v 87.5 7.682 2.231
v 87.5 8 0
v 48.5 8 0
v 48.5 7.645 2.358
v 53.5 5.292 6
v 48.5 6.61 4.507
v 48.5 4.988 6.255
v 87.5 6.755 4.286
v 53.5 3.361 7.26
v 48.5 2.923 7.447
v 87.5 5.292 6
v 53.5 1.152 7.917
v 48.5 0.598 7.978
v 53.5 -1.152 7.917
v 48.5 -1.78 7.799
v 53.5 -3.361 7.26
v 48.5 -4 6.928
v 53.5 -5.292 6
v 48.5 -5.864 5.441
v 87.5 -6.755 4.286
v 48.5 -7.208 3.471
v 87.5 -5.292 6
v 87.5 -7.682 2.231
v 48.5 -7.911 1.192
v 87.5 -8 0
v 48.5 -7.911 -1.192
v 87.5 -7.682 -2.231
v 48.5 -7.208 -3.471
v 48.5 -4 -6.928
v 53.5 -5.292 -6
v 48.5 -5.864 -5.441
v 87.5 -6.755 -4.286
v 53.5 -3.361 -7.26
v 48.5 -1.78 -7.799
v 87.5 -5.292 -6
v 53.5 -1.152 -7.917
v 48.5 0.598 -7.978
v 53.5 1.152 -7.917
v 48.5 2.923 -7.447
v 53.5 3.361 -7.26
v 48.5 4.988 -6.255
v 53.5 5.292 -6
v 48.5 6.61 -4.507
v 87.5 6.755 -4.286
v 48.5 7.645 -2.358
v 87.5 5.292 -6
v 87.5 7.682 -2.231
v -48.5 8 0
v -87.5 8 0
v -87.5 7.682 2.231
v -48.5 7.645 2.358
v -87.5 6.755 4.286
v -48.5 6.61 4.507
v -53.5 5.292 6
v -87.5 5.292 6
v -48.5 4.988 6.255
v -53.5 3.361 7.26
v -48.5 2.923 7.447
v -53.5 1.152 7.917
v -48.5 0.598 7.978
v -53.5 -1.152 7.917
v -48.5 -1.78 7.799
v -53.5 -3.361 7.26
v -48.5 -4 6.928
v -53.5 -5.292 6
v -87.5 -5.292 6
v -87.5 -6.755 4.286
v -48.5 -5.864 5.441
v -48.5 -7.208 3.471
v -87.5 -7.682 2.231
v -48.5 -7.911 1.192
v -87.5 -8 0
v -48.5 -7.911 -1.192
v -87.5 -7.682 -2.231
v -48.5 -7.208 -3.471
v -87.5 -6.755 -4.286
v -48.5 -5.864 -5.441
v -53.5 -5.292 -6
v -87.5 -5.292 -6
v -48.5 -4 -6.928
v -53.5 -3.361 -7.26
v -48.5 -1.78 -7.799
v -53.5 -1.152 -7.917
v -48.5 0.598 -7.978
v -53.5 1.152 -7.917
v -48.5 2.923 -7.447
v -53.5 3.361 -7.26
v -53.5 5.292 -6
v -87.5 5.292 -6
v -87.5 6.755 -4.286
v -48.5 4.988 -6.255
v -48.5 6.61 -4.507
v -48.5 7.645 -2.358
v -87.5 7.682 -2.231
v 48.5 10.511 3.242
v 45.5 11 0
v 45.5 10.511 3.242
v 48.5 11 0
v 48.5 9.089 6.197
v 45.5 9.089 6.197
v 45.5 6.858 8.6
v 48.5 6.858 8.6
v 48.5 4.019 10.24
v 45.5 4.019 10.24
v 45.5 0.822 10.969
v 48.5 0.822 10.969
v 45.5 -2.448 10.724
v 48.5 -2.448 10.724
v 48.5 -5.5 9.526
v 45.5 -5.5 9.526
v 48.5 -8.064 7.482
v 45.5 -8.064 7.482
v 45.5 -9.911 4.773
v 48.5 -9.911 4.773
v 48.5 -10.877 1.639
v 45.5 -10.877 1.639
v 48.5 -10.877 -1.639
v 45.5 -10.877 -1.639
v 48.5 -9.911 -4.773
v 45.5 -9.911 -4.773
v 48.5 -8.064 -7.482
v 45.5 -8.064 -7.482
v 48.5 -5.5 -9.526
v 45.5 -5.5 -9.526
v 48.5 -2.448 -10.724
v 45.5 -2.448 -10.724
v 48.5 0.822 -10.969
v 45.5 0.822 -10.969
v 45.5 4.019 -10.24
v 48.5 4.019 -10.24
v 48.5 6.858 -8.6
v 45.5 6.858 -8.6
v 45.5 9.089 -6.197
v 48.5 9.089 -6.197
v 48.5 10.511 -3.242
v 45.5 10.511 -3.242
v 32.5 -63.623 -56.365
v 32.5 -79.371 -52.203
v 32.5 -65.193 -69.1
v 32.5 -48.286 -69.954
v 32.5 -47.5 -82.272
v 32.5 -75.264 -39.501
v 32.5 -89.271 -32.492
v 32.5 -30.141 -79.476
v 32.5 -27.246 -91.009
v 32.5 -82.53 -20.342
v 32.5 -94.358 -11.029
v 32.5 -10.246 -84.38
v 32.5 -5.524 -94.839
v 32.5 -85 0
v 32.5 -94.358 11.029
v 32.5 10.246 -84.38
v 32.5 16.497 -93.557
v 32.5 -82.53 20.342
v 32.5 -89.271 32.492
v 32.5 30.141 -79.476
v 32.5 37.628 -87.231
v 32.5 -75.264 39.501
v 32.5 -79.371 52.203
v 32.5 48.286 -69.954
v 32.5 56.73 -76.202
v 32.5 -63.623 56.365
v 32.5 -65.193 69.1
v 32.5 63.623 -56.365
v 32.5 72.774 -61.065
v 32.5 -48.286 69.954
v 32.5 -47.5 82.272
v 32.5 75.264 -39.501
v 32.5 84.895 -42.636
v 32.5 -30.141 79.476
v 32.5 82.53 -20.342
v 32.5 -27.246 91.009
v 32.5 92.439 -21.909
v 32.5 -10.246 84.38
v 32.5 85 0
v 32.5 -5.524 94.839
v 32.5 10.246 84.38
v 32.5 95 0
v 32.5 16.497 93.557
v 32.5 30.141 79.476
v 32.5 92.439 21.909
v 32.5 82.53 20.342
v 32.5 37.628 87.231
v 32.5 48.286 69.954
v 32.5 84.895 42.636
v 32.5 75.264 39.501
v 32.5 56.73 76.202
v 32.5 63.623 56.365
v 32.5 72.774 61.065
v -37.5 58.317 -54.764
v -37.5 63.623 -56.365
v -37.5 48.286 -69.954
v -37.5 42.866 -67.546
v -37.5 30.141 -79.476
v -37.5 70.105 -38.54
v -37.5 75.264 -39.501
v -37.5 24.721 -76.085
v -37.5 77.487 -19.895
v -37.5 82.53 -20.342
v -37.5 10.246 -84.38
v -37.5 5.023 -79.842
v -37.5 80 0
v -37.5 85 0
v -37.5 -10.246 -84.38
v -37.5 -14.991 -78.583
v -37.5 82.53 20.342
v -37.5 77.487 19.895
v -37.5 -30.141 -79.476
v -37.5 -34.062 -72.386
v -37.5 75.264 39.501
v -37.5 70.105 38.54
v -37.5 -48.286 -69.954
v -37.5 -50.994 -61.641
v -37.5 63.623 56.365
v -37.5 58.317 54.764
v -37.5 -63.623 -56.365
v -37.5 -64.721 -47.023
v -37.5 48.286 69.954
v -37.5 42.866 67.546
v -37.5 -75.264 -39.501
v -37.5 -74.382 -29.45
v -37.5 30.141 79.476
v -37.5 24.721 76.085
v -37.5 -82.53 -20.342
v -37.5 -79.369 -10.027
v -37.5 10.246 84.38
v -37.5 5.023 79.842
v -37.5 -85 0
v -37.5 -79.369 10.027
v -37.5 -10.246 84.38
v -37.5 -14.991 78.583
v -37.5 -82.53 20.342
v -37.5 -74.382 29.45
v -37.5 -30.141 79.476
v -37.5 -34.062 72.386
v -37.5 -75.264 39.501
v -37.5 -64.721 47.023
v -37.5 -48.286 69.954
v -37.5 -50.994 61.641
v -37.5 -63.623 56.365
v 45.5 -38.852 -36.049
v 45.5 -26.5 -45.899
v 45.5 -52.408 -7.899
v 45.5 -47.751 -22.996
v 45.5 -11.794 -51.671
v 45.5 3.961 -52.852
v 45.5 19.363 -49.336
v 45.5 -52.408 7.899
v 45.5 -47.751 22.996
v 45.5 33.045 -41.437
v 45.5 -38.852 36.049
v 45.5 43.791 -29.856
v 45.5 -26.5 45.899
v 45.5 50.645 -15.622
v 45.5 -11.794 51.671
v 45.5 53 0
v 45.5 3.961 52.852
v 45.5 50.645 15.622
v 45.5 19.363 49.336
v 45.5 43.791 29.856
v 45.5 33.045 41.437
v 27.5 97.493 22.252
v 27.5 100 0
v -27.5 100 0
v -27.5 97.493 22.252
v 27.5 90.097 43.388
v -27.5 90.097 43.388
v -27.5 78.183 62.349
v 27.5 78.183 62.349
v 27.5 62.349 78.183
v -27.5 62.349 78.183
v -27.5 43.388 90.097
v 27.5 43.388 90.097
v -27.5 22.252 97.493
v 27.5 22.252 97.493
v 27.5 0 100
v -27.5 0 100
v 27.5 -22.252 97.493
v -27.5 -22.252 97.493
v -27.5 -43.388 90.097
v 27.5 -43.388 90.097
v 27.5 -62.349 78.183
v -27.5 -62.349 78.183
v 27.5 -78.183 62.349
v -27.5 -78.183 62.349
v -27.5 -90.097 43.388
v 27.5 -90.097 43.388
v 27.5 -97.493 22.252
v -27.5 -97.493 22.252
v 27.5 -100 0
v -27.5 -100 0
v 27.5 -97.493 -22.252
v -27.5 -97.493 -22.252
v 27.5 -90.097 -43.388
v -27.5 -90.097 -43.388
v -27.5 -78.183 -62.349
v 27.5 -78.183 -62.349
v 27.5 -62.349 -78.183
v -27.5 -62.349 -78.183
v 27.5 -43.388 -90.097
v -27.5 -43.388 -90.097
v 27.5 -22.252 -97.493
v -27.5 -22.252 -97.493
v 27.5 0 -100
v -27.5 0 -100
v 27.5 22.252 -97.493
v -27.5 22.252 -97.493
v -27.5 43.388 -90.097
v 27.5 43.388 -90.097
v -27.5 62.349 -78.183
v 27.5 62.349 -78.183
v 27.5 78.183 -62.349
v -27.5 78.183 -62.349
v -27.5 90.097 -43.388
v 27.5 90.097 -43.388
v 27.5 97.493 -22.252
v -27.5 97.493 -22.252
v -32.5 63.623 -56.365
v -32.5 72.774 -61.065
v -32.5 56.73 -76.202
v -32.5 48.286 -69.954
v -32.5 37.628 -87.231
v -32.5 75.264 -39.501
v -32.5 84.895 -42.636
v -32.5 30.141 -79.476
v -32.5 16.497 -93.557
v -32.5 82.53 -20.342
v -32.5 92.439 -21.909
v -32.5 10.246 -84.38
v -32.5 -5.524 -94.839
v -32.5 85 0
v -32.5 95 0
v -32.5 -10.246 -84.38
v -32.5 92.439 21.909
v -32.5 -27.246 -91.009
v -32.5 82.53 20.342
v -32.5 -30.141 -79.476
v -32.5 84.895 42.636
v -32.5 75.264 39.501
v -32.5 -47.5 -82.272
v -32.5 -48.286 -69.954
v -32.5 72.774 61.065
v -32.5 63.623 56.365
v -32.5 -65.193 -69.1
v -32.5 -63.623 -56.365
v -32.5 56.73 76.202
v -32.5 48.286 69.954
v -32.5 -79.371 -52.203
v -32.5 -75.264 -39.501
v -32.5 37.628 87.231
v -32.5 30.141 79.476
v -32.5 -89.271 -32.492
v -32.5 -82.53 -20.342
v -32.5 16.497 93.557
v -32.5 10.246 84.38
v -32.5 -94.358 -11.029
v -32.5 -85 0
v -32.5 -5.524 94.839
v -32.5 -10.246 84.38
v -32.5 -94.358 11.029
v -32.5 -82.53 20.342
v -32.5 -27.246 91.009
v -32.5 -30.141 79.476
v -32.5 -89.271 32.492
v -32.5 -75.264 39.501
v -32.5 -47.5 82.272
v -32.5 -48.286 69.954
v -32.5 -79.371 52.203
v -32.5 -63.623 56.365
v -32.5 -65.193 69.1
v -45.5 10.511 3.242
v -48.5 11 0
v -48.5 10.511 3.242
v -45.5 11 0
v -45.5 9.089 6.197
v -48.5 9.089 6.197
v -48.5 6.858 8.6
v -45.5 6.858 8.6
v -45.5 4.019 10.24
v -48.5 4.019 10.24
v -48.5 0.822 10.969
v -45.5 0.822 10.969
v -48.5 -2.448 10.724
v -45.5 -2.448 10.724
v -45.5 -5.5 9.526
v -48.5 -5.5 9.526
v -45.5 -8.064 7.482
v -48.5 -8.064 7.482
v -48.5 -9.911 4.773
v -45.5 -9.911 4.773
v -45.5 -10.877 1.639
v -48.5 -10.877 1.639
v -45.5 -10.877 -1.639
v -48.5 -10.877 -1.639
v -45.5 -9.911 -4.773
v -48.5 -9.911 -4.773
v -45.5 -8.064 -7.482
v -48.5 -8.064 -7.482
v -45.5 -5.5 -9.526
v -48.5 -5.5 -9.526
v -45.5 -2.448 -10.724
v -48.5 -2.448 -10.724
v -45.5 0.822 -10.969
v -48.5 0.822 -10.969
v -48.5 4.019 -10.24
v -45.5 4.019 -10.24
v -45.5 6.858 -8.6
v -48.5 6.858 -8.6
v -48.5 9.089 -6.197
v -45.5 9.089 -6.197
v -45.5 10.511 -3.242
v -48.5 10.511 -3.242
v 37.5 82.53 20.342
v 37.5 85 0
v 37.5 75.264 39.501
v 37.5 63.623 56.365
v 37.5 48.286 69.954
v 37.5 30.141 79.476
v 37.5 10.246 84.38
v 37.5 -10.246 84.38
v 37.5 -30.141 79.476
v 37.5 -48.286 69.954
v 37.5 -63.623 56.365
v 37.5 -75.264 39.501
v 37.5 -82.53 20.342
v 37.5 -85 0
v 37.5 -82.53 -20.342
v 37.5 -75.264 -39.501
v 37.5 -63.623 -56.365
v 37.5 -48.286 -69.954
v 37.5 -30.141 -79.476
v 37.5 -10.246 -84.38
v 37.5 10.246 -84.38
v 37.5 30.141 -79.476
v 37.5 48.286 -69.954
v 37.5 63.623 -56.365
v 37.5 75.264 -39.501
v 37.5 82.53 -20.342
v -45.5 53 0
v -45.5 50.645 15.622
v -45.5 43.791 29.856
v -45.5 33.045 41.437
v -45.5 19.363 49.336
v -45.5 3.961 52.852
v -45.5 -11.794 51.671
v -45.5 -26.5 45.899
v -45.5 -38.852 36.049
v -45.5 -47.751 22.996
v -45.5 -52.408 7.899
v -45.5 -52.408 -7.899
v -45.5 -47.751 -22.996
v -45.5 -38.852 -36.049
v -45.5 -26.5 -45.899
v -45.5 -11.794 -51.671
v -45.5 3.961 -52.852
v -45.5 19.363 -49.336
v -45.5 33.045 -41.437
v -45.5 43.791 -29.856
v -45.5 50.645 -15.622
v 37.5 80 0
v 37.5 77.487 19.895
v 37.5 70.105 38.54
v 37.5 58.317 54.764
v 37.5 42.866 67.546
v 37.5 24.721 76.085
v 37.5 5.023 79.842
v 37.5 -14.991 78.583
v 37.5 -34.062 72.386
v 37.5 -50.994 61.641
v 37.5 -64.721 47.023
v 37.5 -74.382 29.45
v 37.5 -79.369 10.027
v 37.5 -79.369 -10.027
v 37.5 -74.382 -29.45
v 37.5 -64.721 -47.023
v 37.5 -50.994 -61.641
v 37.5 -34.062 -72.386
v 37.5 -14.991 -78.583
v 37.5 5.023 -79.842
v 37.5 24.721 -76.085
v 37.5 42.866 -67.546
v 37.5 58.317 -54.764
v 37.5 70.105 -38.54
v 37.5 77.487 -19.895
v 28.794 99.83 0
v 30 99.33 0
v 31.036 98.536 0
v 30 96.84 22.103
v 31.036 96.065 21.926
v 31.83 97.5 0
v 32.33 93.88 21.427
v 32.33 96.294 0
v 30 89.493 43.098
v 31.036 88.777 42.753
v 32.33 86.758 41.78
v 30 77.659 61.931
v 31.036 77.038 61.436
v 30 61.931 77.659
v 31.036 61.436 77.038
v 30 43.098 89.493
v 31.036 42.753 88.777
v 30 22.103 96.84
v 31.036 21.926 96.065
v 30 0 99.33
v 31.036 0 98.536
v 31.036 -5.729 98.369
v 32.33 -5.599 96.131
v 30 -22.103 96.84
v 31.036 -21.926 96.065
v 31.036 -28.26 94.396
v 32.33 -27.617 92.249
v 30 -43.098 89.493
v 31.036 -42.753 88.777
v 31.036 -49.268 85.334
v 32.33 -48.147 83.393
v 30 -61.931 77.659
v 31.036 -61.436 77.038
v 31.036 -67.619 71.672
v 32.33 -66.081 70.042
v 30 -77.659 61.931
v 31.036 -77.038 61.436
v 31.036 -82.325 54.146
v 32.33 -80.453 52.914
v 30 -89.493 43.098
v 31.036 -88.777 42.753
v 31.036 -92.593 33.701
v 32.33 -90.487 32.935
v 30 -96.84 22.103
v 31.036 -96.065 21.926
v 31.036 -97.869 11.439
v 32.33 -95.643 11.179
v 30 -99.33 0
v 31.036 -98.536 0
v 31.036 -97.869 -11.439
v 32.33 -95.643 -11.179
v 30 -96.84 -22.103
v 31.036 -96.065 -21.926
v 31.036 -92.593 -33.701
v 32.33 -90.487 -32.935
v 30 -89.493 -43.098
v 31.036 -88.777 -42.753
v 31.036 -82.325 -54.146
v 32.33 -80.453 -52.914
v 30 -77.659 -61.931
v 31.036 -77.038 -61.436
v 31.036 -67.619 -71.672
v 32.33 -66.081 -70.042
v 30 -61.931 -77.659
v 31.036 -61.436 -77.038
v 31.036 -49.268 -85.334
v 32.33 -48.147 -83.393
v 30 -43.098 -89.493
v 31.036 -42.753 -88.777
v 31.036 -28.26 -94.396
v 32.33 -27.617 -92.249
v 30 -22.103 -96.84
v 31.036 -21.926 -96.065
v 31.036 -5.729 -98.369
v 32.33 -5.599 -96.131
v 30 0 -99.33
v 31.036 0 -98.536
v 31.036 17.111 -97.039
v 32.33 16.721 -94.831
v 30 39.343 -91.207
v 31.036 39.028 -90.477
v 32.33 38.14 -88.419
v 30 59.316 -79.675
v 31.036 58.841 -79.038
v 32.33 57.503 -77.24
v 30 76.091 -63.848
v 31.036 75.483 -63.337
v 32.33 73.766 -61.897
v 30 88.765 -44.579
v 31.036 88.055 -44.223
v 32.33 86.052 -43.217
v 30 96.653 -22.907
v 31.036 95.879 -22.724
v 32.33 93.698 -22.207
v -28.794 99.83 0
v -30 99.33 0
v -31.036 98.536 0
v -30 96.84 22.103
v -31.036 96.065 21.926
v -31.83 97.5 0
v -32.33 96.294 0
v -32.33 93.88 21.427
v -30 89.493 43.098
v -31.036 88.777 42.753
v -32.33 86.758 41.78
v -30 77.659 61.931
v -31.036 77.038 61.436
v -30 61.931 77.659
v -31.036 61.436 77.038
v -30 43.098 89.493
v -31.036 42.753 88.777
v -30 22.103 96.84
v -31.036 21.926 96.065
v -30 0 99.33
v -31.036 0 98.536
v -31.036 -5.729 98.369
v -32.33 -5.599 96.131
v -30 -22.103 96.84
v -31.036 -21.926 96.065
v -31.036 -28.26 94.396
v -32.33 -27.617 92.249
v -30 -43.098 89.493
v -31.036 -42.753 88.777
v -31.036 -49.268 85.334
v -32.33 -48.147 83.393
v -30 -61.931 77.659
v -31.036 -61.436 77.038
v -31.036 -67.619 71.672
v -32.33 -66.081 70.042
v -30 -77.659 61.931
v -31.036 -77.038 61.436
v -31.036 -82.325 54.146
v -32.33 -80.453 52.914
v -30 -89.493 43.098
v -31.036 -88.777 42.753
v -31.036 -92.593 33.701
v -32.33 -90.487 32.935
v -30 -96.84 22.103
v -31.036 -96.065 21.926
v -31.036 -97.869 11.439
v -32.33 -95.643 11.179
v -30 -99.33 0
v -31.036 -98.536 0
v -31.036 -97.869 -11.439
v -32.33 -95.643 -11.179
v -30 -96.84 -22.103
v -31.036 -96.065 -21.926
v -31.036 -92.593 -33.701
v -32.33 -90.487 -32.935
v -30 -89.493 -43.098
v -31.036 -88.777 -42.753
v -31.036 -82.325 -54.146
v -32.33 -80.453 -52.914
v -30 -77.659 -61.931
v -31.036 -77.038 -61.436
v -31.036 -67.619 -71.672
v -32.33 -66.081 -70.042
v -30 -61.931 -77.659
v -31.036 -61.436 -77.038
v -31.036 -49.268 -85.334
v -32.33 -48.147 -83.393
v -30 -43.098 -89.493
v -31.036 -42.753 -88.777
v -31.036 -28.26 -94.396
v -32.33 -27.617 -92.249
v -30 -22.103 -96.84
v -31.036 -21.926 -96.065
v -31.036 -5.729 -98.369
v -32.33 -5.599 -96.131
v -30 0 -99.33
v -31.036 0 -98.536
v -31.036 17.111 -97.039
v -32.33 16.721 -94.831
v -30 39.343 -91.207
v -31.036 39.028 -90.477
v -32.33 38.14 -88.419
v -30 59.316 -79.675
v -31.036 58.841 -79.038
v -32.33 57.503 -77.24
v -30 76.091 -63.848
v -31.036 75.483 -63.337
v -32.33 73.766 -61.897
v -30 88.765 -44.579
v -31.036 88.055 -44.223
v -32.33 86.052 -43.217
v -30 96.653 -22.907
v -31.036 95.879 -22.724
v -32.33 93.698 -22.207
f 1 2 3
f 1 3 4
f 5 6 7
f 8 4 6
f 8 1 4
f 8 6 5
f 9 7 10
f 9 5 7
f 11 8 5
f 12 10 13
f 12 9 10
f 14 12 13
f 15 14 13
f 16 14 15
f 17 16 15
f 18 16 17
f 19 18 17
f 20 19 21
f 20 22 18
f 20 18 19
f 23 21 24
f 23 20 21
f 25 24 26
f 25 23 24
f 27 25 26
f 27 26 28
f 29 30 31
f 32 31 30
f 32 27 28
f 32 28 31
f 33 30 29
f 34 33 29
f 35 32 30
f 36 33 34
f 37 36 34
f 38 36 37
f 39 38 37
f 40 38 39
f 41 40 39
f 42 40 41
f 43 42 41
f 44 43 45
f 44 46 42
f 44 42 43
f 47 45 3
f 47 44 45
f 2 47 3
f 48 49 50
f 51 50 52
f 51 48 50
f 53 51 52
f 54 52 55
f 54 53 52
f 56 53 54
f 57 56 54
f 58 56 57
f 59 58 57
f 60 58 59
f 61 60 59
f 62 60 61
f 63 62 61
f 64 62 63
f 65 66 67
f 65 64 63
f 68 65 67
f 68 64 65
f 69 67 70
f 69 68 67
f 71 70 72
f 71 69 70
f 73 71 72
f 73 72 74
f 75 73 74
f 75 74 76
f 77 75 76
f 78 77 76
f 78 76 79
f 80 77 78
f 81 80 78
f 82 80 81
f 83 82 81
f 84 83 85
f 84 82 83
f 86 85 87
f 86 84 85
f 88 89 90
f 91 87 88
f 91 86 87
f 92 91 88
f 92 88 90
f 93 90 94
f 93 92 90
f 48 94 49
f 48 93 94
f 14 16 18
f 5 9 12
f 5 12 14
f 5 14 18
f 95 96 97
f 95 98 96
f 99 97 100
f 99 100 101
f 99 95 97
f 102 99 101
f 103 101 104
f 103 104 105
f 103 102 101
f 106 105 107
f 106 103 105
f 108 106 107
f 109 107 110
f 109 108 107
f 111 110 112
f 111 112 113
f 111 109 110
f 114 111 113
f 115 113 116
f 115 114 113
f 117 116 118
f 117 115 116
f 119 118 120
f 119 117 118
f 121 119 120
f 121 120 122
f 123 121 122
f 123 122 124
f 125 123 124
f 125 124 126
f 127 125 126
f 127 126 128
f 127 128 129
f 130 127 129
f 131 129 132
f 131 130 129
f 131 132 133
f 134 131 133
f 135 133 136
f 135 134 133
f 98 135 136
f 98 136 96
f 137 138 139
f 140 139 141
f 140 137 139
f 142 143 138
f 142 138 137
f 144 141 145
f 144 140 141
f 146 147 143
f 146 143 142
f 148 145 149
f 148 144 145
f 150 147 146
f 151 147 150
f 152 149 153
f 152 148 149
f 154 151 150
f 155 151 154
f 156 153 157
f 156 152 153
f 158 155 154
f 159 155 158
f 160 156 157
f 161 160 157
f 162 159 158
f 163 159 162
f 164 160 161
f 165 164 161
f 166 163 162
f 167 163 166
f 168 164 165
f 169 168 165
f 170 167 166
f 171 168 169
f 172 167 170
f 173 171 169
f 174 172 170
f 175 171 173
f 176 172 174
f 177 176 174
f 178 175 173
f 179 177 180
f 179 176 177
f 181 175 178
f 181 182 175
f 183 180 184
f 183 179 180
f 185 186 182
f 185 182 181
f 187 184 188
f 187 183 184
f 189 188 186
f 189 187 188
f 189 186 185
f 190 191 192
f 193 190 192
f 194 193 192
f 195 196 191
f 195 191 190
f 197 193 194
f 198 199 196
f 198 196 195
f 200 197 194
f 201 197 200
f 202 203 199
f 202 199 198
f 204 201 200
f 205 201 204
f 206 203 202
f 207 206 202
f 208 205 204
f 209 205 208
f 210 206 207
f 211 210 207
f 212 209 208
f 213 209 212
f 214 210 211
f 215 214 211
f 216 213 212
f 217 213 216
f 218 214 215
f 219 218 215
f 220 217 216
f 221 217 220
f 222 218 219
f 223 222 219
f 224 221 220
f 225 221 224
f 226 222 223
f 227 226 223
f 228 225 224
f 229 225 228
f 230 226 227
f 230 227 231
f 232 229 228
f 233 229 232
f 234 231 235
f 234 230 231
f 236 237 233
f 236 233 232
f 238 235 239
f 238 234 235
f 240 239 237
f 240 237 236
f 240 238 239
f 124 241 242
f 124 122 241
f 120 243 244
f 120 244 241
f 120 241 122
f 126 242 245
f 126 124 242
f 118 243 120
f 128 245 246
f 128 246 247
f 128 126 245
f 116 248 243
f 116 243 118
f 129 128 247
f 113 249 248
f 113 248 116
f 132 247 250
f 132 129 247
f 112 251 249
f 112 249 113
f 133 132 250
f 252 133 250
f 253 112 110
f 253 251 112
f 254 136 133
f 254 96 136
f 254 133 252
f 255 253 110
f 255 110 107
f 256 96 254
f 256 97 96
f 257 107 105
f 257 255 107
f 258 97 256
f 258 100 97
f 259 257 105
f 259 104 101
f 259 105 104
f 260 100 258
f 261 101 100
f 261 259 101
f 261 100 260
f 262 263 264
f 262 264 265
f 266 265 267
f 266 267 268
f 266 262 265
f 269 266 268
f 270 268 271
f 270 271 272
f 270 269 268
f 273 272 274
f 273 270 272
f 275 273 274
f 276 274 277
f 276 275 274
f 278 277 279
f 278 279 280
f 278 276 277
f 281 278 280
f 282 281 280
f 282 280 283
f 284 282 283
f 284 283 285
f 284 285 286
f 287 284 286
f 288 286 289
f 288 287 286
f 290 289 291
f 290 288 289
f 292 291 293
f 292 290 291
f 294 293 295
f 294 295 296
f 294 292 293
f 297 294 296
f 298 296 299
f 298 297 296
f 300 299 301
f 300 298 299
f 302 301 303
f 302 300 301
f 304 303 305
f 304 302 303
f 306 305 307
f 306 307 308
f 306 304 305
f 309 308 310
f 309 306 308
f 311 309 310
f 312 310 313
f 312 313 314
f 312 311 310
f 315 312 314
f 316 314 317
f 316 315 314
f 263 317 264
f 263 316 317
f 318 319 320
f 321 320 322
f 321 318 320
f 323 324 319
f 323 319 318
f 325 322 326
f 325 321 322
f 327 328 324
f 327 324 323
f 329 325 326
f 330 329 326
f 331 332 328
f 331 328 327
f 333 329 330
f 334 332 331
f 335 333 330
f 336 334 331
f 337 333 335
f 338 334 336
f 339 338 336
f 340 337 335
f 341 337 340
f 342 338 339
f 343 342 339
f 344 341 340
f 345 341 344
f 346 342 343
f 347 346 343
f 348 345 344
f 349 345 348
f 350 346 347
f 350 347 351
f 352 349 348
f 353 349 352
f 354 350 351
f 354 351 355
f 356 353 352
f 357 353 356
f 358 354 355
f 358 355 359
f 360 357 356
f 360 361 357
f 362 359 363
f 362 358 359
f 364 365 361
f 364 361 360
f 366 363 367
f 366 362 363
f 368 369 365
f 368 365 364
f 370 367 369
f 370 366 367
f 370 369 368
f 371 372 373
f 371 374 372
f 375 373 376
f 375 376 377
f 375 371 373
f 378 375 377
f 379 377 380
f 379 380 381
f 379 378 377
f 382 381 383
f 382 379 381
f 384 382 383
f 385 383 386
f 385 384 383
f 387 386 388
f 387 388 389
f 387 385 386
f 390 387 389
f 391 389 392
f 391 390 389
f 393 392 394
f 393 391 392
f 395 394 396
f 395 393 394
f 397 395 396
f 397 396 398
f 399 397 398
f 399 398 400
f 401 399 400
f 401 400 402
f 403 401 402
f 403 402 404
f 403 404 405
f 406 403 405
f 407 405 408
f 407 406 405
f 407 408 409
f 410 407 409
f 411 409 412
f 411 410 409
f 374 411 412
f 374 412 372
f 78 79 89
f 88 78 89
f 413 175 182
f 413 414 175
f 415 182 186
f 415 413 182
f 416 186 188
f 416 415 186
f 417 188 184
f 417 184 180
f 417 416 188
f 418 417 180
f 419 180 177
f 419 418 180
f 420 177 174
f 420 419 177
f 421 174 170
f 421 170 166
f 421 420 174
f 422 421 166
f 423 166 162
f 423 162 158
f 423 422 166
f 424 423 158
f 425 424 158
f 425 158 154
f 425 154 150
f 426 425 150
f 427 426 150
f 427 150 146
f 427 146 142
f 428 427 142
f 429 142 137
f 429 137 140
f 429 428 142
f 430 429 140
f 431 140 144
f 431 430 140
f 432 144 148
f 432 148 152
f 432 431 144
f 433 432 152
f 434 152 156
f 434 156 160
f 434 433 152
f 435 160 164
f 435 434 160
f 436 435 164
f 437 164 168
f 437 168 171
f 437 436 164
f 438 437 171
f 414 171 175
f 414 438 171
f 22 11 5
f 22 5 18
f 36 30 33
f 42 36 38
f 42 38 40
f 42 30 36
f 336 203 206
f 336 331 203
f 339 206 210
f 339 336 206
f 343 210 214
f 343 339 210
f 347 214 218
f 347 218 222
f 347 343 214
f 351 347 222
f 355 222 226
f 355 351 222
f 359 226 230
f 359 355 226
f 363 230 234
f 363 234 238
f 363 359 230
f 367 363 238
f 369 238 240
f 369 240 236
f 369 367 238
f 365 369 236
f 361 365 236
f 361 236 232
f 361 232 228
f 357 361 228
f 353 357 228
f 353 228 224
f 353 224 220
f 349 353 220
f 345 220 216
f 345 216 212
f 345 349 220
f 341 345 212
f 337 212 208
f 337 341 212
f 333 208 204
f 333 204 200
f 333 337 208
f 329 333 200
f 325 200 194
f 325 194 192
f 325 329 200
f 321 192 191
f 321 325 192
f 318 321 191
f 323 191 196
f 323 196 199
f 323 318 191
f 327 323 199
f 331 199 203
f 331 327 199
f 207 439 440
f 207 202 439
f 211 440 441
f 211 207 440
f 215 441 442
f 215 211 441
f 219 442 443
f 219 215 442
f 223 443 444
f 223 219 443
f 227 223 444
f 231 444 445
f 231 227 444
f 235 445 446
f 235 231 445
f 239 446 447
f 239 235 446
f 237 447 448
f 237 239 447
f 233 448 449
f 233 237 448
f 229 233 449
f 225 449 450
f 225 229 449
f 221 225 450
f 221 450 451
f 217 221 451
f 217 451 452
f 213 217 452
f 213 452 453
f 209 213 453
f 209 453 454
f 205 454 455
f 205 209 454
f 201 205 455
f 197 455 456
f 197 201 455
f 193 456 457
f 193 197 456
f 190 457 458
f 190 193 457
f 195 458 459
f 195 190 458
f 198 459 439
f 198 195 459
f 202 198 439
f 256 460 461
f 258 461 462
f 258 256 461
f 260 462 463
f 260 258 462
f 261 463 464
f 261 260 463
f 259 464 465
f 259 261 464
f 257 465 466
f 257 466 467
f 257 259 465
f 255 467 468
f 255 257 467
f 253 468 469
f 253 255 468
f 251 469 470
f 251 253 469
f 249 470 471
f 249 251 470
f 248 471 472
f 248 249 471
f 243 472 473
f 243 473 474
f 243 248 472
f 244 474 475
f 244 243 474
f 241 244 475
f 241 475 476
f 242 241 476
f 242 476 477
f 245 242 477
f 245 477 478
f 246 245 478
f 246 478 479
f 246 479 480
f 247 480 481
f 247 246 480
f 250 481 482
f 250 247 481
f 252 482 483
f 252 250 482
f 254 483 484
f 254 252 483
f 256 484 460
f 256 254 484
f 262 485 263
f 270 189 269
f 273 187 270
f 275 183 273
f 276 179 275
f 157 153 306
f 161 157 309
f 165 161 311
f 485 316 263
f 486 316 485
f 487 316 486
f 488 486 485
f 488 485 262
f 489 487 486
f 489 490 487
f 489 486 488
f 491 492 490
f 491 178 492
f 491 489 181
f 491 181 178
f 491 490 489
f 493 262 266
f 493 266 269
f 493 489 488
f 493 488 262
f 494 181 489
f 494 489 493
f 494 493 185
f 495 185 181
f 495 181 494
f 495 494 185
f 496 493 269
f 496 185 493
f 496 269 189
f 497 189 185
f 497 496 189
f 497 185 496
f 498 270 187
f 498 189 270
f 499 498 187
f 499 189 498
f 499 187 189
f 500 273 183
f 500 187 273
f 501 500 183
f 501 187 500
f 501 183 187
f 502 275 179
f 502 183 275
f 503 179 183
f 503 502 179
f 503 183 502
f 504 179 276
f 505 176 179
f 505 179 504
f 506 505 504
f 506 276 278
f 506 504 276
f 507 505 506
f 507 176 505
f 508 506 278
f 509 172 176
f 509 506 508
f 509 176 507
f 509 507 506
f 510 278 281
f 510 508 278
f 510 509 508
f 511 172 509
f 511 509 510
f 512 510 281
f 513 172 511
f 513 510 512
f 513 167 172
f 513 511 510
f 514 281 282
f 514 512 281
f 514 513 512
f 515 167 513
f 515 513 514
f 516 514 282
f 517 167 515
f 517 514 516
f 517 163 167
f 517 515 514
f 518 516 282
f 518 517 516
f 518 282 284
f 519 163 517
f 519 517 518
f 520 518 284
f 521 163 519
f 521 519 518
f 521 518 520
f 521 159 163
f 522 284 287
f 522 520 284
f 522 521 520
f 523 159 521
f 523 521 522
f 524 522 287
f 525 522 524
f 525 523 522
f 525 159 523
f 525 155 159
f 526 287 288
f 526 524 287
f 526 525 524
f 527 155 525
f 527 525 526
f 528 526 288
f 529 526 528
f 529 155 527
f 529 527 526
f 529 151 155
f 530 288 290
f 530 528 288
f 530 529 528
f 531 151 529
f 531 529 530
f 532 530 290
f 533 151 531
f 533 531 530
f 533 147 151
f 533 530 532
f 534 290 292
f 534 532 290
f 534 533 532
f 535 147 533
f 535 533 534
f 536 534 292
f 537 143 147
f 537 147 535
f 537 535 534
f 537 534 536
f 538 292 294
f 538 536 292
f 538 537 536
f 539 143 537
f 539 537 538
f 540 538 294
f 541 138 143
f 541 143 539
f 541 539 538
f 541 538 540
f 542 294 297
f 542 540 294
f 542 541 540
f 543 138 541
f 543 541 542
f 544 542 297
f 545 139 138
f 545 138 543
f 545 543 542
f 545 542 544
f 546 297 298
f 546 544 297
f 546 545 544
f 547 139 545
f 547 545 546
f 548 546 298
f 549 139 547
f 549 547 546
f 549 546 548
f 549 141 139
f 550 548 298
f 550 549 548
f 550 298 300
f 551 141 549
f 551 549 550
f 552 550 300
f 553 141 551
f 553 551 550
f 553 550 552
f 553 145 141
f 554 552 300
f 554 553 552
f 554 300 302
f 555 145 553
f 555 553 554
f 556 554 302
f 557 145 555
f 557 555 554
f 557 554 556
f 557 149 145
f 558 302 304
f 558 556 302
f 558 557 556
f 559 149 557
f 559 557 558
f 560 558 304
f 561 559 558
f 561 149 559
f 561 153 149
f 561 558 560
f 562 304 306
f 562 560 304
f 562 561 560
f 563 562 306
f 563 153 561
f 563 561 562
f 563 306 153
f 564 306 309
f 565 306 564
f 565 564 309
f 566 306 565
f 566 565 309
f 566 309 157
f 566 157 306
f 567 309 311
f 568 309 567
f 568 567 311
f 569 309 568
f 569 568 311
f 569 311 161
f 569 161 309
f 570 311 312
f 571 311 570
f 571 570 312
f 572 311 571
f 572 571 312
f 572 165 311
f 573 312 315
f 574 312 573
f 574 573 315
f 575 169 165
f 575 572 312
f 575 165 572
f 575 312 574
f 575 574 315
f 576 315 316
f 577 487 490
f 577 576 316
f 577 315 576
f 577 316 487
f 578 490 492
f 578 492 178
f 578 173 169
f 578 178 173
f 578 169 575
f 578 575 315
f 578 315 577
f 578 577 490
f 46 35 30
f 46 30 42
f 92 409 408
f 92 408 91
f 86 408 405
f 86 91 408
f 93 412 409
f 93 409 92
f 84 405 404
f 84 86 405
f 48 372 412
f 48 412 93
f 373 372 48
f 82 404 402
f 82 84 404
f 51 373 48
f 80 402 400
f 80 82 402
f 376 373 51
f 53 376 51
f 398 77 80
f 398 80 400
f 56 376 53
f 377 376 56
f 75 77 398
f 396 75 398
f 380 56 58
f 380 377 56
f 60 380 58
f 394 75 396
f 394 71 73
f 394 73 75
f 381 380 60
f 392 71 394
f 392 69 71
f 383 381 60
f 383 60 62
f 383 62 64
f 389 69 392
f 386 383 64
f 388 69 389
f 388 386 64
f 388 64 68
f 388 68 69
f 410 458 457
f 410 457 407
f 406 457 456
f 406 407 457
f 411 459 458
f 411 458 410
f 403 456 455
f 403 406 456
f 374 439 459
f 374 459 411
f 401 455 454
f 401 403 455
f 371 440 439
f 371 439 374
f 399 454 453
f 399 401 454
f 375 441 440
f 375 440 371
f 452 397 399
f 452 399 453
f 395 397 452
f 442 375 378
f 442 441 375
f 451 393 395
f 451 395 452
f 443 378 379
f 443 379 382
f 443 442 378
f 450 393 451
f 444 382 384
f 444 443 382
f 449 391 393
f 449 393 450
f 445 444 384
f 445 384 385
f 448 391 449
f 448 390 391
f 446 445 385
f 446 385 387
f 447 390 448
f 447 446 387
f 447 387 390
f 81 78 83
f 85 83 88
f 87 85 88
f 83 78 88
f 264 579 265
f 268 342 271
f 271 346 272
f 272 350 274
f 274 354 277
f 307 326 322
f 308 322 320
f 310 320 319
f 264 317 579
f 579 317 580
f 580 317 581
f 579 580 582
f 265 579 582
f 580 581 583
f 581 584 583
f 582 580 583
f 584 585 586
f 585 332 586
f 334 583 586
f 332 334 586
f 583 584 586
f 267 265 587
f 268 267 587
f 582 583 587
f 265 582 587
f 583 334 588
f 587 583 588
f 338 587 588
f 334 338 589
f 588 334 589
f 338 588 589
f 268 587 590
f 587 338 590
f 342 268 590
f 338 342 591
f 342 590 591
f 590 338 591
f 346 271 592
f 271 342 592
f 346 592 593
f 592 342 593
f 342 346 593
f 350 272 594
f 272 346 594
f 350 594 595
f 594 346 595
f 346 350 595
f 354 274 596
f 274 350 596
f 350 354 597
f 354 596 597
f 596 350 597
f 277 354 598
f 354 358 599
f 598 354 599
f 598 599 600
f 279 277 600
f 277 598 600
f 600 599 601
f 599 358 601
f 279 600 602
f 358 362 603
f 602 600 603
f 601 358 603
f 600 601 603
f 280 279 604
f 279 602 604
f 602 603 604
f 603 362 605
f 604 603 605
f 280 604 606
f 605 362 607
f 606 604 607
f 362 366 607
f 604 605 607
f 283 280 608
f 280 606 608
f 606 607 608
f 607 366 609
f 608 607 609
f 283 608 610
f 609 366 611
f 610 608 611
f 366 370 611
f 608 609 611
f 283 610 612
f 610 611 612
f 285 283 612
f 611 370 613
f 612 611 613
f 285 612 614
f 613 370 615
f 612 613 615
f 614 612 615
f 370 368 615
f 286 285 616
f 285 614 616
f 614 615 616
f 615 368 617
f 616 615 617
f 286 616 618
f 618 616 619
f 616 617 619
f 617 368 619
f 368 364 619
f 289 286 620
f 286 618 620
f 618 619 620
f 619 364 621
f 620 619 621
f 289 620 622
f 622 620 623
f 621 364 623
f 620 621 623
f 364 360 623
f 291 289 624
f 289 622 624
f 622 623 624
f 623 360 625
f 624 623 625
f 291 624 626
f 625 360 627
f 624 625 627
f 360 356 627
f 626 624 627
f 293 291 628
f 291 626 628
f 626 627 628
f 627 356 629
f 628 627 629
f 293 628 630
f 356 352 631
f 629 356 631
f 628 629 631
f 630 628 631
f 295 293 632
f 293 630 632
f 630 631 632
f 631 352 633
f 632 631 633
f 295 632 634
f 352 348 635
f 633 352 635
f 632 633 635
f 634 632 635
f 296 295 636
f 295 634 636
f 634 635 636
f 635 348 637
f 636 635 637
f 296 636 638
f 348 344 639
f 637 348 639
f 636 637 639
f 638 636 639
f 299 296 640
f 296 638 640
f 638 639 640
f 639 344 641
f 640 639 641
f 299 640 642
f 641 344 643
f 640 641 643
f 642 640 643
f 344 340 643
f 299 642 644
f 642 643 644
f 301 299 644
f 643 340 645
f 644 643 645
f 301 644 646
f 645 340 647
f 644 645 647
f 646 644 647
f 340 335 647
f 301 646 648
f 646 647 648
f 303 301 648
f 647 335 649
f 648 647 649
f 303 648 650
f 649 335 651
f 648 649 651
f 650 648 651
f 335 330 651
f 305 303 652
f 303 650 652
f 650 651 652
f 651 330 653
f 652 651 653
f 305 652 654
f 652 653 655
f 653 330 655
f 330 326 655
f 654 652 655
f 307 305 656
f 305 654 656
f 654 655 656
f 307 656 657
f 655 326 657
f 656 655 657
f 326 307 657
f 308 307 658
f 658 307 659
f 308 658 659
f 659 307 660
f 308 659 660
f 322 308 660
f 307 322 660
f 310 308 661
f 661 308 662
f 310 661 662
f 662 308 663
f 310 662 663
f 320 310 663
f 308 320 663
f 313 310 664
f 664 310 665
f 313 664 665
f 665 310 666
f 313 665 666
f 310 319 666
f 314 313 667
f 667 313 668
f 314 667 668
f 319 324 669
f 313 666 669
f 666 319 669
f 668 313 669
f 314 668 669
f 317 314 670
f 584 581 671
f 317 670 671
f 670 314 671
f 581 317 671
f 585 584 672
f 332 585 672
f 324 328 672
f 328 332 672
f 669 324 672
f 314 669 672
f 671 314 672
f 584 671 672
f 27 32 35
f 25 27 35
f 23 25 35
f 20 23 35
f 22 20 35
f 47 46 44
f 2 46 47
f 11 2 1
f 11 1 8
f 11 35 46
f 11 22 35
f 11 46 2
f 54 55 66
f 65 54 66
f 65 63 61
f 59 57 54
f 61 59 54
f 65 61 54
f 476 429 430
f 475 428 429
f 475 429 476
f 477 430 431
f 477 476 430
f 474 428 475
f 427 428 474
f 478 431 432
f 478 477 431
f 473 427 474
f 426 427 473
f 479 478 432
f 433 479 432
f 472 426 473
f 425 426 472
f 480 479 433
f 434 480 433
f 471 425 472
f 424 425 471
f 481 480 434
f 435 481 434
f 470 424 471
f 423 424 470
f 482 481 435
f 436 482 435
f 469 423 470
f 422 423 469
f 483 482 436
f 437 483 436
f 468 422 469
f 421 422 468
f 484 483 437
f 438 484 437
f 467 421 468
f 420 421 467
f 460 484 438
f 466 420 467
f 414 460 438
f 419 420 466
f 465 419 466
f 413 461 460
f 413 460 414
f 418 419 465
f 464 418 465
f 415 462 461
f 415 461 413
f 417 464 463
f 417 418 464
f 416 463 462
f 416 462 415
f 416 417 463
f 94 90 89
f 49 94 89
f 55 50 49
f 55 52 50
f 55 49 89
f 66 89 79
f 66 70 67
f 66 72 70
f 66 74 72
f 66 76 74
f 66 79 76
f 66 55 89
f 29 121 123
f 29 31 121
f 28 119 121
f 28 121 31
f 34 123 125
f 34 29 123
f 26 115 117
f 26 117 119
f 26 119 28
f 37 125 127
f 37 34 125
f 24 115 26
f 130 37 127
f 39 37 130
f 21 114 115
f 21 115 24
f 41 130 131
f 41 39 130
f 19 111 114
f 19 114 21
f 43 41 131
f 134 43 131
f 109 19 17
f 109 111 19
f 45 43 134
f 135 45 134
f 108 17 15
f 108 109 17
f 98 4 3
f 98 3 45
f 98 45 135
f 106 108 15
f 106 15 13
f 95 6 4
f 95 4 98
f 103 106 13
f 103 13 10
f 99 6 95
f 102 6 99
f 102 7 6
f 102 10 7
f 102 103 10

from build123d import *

# Parameters (mm, degrees)
FILLET_1_R           = 5
CUT_EXTRUDE_START    = -53.5
SKETCH_2_OUTSIDE_W   = 268.52
SKETCH_2_OUTSIDE_H   = 268.52
CUT_EXTRUDE_1_DEPTH  = 35
CUT_EXTRUDE_START_2  = 53.5
SKETCH_2_2_OUTSIDE_W = 268.52
SKETCH_2_2_OUTSIDE_H = 268.52
CUT_EXTRUDE_2_DEPTH  = 35


with BuildPart() as part:
    # Эскиз1 → Повернуть1 (revolve)
    with BuildSketch(Plane.XY):
        Polygon((-32.5, 100), (32.5, 100), (32.5, 85), (37.5, 85), (37.5, 80), (45.5, 53), (45.5, 11), (48.5, 11), (48.5, 8), (87.5, 8), (87.5, 0), (-87.5, 0), (-87.5, 8), (-48.5, 8), (-48.5, 11), (-45.5, 11), (-45.5, 53), (-37.5, 80), (-37.5, 85), (-32.5, 85), align=None)
    revolve(axis=Axis((-1100.903674864, 0, 0), (1, 0, 0)))

    # Скругление1
    fillet_1_edges = [part.edges().sort_by_distance(p)[0] for p in [
        (32.5, -100, 0),
        (-32.5, -100, 0),
    ]]
    fillet(fillet_1_edges, radius=FILLET_1_R)

    # Эскиз2 outside → Вырез-Вытянуть1 (cut, through all)
    with BuildSketch(Plane(origin=(0, 0, 0), x_dir=(0, 0, -1), z_dir=(1, 0, 0)).offset(CUT_EXTRUDE_START)):
        Rectangle(SKETCH_2_OUTSIDE_W, SKETCH_2_OUTSIDE_H)
        with BuildLine():
            Line((-6, 5.291502622), (-6, -5.291502622))
            ThreePointArc((-6, -5.291502622), (0, -8), (6, -5.291502622))
            Line((6, -5.291502622), (6, 5.291502622))
            ThreePointArc((6, 5.291502622), (0, 8), (-6, 5.291502622))
        make_face(mode=Mode.SUBTRACT)
    extrude(amount=-CUT_EXTRUDE_1_DEPTH, mode=Mode.SUBTRACT)

    # Эскиз2<2> outside → Вырез-Вытянуть2 (cut, through all)
    with BuildSketch(Plane(origin=(0, 0, 0), x_dir=(0, 0, -1), z_dir=(1, 0, 0)).offset(CUT_EXTRUDE_START_2)):
        Rectangle(SKETCH_2_2_OUTSIDE_W, SKETCH_2_2_OUTSIDE_H)
        with BuildLine():
            Line((-6, 5.291502622), (-6, -5.291502622))
            ThreePointArc((-6, -5.291502622), (0, -8), (6, -5.291502622))
            Line((6, -5.291502622), (6, 5.291502622))
            ThreePointArc((6, 5.291502622), (0, 8), (-6, 5.291502622))
        make_face(mode=Mode.SUBTRACT)
    extrude(amount=CUT_EXTRUDE_2_DEPTH, mode=Mode.SUBTRACT)


solid = part.part
